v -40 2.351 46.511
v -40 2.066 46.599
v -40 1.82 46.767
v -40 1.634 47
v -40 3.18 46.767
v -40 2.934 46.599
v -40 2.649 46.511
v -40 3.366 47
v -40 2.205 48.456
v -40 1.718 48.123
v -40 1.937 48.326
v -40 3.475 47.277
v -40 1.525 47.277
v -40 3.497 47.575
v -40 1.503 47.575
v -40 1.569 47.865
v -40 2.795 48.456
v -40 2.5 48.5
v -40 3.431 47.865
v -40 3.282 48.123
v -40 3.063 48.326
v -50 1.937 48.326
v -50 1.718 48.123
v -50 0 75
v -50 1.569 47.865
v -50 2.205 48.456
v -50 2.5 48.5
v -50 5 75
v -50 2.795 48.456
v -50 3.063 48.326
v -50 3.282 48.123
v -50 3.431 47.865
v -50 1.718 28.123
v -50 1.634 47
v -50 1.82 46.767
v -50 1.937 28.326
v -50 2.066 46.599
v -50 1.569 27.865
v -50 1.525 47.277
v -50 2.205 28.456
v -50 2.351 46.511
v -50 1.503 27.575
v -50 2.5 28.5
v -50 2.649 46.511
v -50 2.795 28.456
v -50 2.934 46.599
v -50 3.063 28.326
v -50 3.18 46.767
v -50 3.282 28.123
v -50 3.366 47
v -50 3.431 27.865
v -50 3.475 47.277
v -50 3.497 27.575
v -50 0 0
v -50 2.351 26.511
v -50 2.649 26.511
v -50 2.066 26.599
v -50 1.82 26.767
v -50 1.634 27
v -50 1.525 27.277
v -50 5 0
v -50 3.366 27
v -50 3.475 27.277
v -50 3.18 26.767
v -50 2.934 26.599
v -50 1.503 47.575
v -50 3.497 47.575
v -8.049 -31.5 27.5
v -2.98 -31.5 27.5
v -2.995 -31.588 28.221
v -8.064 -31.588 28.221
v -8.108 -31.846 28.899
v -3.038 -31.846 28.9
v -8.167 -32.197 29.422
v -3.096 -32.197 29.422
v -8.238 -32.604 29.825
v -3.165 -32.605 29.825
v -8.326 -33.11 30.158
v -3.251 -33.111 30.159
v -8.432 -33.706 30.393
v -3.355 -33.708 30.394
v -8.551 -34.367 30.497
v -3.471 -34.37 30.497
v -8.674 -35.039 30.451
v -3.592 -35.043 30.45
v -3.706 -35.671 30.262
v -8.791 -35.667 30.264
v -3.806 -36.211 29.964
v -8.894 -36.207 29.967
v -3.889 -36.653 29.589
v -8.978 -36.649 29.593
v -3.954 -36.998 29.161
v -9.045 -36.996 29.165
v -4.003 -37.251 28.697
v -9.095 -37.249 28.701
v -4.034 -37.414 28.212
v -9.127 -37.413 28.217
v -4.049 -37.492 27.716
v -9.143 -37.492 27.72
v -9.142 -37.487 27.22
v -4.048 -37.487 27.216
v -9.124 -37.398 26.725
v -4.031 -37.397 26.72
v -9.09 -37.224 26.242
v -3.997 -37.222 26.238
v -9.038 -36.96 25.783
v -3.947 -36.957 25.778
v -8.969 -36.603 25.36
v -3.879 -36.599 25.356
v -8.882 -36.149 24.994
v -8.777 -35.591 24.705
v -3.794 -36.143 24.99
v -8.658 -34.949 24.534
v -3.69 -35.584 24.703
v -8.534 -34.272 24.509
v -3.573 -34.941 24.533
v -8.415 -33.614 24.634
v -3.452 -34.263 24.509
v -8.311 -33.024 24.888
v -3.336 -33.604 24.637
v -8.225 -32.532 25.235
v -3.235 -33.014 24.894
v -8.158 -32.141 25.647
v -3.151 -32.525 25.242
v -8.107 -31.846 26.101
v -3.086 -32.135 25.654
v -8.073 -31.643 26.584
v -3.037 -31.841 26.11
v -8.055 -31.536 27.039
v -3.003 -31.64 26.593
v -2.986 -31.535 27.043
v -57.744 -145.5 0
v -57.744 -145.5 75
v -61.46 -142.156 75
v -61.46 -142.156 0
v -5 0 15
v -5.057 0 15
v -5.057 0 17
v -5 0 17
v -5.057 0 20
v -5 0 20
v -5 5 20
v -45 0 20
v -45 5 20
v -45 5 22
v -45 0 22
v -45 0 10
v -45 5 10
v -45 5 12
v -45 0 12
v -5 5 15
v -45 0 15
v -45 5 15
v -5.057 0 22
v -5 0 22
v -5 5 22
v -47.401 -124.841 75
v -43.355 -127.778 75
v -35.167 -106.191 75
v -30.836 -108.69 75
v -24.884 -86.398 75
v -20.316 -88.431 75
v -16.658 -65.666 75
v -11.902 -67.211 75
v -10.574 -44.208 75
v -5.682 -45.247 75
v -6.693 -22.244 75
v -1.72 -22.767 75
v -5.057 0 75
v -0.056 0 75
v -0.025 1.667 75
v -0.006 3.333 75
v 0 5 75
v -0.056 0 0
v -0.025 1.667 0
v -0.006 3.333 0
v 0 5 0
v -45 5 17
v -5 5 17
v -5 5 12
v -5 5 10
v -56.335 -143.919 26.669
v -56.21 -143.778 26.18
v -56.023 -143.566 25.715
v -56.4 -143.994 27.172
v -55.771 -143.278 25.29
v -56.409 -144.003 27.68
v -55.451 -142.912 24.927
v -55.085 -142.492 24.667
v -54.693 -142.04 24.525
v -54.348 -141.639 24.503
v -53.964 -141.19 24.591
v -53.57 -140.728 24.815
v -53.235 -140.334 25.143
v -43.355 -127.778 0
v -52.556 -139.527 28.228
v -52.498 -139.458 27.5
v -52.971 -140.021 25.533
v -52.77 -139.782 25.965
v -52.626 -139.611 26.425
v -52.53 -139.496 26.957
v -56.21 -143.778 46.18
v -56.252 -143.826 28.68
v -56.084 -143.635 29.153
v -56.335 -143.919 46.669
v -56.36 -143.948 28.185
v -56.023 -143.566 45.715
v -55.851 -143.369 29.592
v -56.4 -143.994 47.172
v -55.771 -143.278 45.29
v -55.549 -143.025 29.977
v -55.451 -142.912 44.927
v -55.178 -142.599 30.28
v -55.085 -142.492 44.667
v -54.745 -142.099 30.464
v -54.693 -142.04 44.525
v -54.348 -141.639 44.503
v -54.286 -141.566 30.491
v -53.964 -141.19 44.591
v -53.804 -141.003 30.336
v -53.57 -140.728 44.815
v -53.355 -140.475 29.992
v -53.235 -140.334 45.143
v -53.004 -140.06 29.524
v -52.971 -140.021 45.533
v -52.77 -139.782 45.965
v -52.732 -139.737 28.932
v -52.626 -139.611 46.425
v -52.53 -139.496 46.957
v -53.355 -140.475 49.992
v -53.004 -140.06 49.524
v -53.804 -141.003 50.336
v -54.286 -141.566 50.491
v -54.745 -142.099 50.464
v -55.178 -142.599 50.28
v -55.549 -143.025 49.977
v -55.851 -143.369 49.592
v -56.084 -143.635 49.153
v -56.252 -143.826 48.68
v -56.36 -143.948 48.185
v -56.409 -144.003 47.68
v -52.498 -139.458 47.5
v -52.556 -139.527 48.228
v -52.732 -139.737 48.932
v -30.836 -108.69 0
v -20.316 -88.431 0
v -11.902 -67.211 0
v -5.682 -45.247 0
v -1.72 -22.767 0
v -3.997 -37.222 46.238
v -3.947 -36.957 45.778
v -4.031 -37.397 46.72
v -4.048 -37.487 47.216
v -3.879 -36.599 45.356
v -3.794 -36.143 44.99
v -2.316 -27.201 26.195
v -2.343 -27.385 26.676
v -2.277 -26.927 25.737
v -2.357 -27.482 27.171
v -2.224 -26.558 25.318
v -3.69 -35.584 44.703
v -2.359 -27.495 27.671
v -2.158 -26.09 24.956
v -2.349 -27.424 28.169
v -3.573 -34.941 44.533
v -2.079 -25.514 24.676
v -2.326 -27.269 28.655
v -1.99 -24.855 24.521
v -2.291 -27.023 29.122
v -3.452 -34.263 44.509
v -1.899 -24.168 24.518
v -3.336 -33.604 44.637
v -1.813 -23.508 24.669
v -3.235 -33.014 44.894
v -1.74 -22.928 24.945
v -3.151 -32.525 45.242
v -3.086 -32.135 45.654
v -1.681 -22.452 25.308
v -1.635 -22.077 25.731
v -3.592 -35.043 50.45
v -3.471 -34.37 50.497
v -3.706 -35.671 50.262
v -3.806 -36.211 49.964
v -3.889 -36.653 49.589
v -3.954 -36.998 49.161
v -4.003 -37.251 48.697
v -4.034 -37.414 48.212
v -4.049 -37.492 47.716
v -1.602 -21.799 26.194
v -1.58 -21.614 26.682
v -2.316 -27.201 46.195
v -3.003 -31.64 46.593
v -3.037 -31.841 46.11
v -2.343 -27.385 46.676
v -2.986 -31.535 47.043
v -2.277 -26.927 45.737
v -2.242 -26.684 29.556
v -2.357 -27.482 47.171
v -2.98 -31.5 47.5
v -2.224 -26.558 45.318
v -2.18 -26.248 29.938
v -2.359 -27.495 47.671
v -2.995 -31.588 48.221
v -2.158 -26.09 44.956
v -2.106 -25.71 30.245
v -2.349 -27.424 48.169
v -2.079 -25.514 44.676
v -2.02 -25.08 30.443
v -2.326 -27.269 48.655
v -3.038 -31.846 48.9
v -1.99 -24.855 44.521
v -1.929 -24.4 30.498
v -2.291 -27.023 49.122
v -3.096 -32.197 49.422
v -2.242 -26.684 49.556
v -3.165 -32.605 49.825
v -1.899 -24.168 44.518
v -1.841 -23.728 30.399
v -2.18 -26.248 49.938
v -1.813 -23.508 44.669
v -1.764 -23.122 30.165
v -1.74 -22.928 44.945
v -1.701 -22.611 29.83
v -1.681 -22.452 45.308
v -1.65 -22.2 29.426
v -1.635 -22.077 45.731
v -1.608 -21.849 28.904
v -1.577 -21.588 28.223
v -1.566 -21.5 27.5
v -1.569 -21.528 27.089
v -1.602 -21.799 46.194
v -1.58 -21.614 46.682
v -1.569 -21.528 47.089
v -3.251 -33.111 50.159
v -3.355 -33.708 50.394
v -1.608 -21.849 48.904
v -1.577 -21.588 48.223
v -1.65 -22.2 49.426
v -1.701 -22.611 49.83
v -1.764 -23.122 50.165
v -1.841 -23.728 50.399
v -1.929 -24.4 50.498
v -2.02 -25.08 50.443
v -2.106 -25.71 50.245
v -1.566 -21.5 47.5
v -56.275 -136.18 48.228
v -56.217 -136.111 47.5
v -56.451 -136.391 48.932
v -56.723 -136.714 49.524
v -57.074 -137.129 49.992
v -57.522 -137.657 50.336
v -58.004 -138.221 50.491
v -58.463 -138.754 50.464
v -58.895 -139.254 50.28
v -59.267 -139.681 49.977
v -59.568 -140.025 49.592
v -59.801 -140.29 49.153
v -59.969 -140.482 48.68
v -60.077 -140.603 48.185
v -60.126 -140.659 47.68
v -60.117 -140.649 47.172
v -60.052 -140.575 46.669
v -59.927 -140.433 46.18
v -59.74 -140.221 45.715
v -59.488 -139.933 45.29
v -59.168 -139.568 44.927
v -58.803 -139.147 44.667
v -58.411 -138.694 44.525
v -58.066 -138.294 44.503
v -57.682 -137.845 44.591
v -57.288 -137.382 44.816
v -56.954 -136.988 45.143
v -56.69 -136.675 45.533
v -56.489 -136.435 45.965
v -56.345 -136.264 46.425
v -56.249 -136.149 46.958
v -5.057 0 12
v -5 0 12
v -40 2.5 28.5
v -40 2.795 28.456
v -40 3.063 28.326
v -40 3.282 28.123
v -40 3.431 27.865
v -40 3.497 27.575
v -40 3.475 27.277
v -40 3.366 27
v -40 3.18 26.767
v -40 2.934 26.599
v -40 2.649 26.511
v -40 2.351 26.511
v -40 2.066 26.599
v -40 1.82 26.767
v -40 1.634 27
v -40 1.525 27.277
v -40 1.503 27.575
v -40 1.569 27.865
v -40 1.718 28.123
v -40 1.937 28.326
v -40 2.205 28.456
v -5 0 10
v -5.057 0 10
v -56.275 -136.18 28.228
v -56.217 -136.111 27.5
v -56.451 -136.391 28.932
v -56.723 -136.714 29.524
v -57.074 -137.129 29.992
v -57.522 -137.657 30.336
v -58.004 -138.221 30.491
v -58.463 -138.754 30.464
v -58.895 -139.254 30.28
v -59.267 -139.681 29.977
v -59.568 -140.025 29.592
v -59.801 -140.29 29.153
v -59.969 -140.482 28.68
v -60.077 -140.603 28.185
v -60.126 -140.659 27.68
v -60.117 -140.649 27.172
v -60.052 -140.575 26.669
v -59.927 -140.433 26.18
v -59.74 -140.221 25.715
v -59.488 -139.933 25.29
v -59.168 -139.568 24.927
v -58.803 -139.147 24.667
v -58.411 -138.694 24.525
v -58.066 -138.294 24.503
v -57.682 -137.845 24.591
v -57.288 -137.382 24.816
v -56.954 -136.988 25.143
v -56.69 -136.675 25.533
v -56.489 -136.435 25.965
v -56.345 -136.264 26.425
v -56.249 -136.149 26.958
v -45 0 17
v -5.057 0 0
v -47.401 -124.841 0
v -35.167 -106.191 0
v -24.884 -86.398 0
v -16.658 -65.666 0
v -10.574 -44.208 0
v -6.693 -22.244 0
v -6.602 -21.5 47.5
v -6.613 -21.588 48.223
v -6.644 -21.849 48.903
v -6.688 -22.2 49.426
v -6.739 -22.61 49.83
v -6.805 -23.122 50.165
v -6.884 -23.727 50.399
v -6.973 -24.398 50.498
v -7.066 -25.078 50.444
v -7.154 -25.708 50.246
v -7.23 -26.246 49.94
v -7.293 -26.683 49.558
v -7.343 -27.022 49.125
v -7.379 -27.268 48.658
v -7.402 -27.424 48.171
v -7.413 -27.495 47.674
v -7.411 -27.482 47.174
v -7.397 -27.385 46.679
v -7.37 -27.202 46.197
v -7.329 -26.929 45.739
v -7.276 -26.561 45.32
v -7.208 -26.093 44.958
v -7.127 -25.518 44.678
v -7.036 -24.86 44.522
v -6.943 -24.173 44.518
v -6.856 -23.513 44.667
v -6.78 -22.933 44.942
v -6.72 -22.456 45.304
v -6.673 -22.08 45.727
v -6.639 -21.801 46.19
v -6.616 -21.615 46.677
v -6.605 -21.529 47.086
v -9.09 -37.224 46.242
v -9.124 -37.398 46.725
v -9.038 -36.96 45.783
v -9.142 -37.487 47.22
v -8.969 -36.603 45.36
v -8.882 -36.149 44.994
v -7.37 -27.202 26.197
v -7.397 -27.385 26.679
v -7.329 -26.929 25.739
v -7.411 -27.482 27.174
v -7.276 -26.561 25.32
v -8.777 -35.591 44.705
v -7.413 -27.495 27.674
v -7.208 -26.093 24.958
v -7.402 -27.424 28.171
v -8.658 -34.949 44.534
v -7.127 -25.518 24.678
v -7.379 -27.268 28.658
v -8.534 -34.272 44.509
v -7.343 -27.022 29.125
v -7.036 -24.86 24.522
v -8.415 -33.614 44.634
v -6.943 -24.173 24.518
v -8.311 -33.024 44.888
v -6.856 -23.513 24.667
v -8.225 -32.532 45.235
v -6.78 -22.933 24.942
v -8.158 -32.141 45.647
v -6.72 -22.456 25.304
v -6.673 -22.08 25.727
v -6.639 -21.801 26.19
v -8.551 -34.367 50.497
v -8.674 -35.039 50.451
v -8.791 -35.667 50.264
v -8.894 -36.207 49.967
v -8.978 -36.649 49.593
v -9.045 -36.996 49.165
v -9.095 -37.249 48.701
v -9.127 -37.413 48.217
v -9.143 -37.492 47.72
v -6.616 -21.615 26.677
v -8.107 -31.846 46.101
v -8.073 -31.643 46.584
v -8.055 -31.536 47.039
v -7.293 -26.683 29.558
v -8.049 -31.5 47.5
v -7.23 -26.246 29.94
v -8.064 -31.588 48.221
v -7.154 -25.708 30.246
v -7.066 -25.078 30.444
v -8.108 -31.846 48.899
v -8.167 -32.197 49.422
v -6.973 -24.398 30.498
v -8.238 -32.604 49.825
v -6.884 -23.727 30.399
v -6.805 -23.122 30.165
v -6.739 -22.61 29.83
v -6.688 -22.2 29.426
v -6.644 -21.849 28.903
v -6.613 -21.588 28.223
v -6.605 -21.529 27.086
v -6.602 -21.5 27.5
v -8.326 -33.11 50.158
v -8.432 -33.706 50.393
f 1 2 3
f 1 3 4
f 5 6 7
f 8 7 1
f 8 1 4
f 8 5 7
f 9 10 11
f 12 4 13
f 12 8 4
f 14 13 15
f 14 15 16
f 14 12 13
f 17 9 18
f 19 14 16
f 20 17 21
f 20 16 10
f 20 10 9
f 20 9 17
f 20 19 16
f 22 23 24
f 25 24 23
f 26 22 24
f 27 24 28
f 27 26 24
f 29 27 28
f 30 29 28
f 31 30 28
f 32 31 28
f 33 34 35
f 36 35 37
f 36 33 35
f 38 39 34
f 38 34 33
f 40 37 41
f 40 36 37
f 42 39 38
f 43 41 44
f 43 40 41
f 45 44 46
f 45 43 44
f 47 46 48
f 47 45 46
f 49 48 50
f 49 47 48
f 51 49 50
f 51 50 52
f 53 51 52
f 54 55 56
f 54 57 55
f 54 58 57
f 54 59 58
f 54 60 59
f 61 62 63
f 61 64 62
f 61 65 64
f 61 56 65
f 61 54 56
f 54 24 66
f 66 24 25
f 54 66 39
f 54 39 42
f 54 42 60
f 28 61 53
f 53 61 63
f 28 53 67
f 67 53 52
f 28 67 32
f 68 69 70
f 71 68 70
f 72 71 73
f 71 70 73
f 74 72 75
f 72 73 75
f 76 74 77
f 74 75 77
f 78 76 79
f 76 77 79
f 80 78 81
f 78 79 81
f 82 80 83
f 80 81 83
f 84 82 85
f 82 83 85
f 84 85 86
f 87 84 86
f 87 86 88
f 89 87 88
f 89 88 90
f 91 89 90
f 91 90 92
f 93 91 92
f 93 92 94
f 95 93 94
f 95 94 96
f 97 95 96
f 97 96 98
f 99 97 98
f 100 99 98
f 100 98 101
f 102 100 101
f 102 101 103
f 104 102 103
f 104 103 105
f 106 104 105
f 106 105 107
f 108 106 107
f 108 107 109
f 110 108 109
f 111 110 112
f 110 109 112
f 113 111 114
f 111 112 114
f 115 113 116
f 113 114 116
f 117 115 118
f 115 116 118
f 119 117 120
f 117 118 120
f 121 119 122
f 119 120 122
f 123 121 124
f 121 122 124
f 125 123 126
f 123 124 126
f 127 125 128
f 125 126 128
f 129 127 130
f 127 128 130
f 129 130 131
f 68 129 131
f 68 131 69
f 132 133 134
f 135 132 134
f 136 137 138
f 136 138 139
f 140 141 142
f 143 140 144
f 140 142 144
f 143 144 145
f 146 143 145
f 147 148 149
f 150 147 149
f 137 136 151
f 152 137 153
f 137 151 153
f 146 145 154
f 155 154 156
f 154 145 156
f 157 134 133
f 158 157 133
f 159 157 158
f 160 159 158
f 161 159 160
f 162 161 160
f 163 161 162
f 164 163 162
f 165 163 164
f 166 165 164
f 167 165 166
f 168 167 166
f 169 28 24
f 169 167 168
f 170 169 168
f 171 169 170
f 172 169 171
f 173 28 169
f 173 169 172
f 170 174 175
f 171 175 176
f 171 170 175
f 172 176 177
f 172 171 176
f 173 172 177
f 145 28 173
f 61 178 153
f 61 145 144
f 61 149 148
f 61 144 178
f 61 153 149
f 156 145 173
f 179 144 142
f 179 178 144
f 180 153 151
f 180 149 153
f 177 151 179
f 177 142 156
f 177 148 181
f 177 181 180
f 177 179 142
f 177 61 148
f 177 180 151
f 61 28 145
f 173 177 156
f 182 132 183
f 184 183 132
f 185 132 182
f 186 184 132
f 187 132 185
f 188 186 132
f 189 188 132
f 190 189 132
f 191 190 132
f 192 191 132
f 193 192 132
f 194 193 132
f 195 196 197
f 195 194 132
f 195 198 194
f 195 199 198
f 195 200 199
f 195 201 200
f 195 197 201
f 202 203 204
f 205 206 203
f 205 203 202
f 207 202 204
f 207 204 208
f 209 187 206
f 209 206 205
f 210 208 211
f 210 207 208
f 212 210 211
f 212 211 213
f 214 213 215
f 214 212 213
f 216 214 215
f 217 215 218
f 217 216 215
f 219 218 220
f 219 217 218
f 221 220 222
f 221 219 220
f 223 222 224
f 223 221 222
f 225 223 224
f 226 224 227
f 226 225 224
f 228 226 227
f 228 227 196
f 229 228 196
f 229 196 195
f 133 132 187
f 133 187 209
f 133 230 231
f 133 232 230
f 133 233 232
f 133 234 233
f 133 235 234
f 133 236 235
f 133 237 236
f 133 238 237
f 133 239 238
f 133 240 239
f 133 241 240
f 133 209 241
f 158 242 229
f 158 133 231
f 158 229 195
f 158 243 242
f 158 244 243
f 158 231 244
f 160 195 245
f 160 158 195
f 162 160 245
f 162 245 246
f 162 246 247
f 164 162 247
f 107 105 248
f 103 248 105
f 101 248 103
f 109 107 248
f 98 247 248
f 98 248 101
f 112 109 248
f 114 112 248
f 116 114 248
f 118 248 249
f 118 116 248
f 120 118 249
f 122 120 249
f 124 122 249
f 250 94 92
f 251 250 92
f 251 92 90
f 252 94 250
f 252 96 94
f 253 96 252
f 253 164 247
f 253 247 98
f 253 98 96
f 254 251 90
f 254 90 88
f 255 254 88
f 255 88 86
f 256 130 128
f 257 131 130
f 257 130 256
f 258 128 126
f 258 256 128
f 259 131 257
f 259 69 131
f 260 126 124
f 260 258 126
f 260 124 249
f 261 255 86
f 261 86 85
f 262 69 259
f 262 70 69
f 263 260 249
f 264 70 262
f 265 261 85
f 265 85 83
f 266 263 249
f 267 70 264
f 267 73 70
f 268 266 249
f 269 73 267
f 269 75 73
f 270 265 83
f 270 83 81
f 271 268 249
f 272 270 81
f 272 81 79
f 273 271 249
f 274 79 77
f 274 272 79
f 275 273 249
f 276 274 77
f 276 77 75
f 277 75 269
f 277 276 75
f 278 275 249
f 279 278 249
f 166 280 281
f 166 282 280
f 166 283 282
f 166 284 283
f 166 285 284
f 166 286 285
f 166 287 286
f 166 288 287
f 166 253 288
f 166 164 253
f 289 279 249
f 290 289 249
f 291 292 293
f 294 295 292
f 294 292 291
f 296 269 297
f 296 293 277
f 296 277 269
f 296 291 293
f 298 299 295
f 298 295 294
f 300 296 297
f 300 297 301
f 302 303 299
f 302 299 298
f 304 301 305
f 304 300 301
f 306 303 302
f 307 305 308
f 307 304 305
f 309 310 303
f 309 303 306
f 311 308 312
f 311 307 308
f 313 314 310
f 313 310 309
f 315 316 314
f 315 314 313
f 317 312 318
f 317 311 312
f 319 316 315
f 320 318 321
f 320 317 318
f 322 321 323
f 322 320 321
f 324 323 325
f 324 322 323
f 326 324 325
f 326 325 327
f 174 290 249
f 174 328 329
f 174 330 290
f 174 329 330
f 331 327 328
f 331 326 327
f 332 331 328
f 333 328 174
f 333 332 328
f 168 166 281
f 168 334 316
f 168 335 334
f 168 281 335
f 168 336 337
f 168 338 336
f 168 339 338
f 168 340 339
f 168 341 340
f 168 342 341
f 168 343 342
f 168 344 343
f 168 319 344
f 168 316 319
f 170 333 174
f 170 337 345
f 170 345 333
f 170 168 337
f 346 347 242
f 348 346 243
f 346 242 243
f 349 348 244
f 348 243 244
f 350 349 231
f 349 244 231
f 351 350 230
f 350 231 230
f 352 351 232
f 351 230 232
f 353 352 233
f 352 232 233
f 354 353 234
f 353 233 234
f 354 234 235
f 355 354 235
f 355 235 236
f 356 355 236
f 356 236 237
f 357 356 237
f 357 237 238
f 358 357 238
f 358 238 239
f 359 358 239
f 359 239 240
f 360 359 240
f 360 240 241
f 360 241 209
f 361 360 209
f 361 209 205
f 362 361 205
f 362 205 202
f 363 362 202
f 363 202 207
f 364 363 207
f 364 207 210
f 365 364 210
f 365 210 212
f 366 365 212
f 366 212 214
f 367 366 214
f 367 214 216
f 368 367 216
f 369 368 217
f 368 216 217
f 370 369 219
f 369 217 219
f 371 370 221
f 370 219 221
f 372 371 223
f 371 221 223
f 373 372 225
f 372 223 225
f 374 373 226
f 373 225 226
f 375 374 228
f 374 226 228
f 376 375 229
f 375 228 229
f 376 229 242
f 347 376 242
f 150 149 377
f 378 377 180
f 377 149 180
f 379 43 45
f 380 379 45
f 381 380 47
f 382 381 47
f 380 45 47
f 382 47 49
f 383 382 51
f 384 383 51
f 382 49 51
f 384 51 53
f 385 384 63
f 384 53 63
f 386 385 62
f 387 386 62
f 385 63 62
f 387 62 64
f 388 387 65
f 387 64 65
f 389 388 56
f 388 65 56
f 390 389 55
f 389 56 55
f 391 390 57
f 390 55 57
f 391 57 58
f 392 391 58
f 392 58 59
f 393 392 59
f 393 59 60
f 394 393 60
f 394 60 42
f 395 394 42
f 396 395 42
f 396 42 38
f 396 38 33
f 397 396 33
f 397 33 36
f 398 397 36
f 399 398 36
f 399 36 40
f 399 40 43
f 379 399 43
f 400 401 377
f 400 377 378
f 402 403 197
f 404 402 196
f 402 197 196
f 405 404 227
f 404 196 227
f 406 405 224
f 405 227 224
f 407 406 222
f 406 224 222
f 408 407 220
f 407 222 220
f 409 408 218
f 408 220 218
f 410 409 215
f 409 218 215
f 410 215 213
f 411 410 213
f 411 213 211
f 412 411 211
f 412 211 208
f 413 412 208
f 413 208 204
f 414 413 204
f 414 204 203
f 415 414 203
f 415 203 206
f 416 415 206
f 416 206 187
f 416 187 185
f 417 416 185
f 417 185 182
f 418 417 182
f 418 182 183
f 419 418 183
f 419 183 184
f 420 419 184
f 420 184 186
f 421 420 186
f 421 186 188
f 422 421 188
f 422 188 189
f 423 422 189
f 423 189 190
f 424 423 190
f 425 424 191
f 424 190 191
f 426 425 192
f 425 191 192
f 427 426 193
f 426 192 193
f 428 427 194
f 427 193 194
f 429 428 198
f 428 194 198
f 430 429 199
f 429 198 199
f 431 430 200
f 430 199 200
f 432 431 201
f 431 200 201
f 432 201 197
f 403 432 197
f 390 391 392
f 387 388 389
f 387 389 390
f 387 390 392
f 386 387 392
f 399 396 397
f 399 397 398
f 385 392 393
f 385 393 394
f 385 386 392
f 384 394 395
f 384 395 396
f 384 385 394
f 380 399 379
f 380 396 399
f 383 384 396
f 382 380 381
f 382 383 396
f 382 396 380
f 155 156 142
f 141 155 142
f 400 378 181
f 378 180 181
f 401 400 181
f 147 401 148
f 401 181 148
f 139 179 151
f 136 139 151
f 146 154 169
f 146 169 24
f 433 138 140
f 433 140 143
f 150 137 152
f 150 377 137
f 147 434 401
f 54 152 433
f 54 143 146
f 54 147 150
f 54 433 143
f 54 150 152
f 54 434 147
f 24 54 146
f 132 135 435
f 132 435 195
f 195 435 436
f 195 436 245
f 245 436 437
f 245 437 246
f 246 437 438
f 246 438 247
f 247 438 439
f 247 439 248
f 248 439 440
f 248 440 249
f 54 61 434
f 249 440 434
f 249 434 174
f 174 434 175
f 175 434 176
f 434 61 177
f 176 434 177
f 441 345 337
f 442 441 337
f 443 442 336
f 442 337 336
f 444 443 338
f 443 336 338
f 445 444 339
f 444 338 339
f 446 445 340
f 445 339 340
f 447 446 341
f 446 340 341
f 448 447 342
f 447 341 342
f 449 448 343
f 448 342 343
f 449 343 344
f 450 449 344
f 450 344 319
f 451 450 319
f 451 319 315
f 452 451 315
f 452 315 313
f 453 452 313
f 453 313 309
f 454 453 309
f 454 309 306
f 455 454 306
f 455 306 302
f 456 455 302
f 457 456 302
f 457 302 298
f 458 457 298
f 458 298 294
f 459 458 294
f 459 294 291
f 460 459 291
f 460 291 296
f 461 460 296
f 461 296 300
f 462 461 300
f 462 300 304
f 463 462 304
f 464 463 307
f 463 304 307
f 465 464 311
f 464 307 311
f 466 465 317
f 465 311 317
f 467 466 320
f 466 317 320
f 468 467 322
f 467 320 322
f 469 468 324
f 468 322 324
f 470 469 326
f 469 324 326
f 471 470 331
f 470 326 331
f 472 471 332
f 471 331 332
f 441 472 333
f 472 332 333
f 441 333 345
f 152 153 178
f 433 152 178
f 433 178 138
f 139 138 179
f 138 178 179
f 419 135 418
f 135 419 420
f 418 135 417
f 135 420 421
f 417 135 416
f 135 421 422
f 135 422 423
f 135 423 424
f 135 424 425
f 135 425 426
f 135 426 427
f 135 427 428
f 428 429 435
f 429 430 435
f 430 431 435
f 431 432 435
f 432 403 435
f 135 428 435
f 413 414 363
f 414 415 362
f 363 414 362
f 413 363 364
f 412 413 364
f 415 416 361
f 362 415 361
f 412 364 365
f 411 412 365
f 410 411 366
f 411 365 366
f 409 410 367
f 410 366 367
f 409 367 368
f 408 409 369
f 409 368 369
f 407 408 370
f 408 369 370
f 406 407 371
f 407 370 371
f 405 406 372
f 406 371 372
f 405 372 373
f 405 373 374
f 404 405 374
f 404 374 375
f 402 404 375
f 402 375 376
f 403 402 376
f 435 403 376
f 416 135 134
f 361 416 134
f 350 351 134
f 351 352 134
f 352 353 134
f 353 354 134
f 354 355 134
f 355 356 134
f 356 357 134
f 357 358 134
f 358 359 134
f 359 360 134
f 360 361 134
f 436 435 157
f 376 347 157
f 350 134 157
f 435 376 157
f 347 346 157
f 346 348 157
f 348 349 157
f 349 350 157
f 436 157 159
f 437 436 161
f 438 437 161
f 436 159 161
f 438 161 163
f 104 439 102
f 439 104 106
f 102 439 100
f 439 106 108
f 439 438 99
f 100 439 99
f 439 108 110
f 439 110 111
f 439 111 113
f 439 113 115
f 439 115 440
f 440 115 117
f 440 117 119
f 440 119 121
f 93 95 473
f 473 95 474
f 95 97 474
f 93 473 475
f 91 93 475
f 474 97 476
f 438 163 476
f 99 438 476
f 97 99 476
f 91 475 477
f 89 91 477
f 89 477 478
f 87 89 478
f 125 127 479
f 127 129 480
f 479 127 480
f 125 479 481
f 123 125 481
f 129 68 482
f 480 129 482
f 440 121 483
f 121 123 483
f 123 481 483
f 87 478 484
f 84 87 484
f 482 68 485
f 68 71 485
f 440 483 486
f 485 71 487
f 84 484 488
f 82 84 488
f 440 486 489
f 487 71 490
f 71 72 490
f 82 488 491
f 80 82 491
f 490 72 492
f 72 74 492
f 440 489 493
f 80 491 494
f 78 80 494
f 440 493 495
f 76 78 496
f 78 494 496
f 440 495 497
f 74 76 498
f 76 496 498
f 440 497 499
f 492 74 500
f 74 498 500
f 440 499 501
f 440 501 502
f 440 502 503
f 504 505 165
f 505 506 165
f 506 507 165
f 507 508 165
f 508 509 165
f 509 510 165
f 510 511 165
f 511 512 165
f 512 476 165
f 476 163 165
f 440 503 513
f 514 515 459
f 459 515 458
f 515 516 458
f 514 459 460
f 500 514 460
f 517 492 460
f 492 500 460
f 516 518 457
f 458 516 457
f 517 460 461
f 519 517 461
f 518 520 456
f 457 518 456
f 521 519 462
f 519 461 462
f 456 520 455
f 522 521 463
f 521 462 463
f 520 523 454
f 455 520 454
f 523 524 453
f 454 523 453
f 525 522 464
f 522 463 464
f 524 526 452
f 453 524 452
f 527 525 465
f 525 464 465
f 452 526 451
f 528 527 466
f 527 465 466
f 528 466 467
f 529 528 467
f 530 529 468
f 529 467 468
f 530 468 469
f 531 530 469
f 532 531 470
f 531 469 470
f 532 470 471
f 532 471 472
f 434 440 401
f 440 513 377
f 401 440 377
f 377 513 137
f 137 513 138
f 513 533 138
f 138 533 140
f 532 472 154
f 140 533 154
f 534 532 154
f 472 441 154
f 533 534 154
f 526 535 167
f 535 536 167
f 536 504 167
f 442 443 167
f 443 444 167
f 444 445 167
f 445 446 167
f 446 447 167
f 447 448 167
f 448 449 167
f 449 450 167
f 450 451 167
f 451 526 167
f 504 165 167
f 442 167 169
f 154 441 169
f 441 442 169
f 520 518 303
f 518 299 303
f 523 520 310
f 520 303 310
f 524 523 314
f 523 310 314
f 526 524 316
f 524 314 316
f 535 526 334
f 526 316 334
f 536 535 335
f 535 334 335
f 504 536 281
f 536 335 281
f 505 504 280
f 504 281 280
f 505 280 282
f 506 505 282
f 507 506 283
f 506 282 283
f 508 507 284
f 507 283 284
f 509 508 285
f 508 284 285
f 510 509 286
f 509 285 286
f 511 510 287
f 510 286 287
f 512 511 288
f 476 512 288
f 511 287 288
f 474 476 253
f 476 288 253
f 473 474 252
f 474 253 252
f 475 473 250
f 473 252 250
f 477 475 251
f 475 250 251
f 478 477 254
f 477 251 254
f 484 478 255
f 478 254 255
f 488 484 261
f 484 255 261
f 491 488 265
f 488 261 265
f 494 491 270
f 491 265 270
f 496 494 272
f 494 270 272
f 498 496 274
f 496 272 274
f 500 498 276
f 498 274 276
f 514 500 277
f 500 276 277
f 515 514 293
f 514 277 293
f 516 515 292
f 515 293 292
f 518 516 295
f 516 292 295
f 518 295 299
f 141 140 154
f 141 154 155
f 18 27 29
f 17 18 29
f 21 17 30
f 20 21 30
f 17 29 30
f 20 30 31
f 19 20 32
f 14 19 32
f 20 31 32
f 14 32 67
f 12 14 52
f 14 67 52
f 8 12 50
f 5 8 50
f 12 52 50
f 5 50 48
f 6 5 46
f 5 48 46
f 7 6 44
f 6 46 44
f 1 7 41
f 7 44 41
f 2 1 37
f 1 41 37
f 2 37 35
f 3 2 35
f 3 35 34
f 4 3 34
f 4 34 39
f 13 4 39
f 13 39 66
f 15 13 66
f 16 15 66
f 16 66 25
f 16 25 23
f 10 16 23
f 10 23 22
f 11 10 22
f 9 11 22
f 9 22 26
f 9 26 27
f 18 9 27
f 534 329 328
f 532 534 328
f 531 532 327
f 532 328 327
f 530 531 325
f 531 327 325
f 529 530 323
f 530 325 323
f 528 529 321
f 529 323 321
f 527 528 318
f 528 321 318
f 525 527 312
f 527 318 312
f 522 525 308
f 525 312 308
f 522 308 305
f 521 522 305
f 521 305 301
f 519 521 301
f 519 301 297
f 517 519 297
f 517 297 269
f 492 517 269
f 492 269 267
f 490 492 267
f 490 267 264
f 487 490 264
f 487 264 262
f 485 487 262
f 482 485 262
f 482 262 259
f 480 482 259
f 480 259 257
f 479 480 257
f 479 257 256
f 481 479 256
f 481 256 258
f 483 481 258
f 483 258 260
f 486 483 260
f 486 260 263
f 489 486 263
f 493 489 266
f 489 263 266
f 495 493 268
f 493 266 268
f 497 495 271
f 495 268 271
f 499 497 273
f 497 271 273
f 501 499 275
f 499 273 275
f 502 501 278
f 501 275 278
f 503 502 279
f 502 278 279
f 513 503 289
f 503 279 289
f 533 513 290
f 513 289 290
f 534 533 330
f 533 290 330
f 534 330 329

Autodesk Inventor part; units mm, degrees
ref_plane "YZ Plane" through (0, 0, 0) normal (1, 0, 0) x (0, 1, 0)
sketch "Sketch1" plane through (0, 0, 0) normal (0, 0, 1) x (1, 0, 0)
  line L0 (0, 0) -> (-50, 0)
  line L1 (-50, 0) -> (-50, 5)
  line L2 (-50, 5) -> (0, 5)
  line L3 (0, 5) -> (0, 0)
  dimension "d0" = 50
  dimension "d1" = 5
extrude "Extrusion1" add sketch "Sketch1" along normal blind 75
sketch "Sketch2" plane through (0, 0, 75) normal (0, 0, 1) x (1, 0, 0)
  circle A0 centre (-225, 5) radius 225 construction
  circle A1 centre (-225, 5) radius 220 construction
  line L0 (0, 0) -> (0, 5) projected
  line L1 (0, 5) -> (-5, 5)
  arc A2 (-57.7435, -145.5) -> (0, 5) centre (-225, 5) ccw
  line L2 (-57.7435, -145.5) -> (-61.4603, -142.1556)
  arc A3 (-61.4603, -142.1556) -> (-5, 5) centre (-225, 5) ccw
  dimension "d4" = 450
  dimension "d5" = 5
  dimension "d6" = 5
  dimension "d7" = 150.5
extrude "Extrusion2" add sketch "Sketch2" against normal blind 75
sketch "Sketch3" plane through (-50, 5, 0) normal (0, 1, 0) x (1, 0, 0)
  line L0 (45, -10) -> (5, -10)
  line L1 (5, -10) -> (5, -12)
  line L2 (5, -12) -> (45, -12)
  line L3 (45, -12) -> (45, -10)
  line L4 (0, 0) -> (0, -75) projected
  line L5 (0, 0) -> (50, 0) projected
  line L6 (5, -17) -> (45, -17)
  line L7 (45, -17) -> (45, -15)
  line L8 (45, -15) -> (5, -15)
  line L9 (5, -15) -> (5, -17)
  line L10 (5, -22) -> (45, -22)
  line L11 (45, -22) -> (45, -20)
  line L12 (45, -20) -> (5, -20)
  line L13 (5, -20) -> (5, -22)
  dimension "d10" = 40
  dimension "d11" = 2
  dimension "d12" = 5
  dimension "d13" = 10
  dimension "d16" = 5
extrude "Extrusion3" cut sketch "Sketch3" against normal blind 5
ref_plane "Work Plane1" through (0, 5, 0) normal (1, 0, 0) x (0, 1, 0)
sketch "Sketch4" plane through (0, 5, 0) normal (1, 0, 0) x (0, 1, 0)
  circle A0 centre (-29.5, 47.5) radius 3
  circle A1 centre (-29.5, 27.5) radius 3
  line L0 (-5, 0) -> (-5, 75) projected
  line L1 (-150.5, 0) -> (-5, 0) projected
  circle A2 centre (-39.5, 47.5) radius 3
  circle A3 centre (-39.5, 27.5) radius 3
  line L2 (0, 0) -> (0, 75) projected
  dimension "d23" = 6
  dimension "d24" = 6
  dimension "d26" = 27.5
  dimension "d27" = 20
  dimension "d30" = 6
  dimension "d31" = 6
  dimension "d32" = 10
  dimension "d33" = 29.5
extrude "Extrusion4" cut sketch "Sketch4" along normal through all both and the other way through all
ref_plane "Work Plane2" through (-57.7435, -145.5, 75) normal (0.7434, -0.6689, 0) x (0.6689, 0.7434, 0)
sketch "Sketch5" plane through (-57.7435, -145.5, 75) normal (0.7434, -0.6689, 0) x (0.6689, 0.7434, 0)
  circle A0 centre (5, -27.5) radius 3
  circle A1 centre (5, -47.5) radius 3
  line L0 (0, 0) -> (0, -75) projected
  line L1 (0, -75) -> (146.746, -75) projected
  point P0 (146.7832, -75)
  dimension "d34" = 6
  dimension "d35" = 6
  dimension "d36" = 5
  dimension "d37" = 27.5
  dimension "d38" = 20
extrude "Extrusion5" cut sketch "Sketch5" along normal through all both and the other way through all
sketch "Sketch6" plane through (-50, 0, 0) normal (-1, 0, 0) x (0, 0, 1)
  circle A0 centre (47.5, 2.5) radius 1
  circle A1 centre (27.5, 2.5) radius 1
  line L0 (0, 0) -> (0, 5) projected
  line L1 (0, 5) -> (75, 5) projected
  dimension "d41" = 2
  dimension "d42" = 2
  dimension "d43" = 27.5
  dimension "d44" = 20
  dimension "d45" = 2.5
extrude "Extrusion6" cut sketch "Sketch6" against normal blind 10
thread "Thread1" size "M2x0.4" class "6H" standard "ANSI Metric M Profile" full length
thread "Thread2" size "M2x0.4" class "6H" standard "ANSI Metric M Profile" full length
sketch "Sketch7" plane through (0, 0, 75) normal (0, 0, 1) x (1, 0, 0)
  circle A0 centre (-225, 5) radius 225
  circle A1 centre (-225, 5) radius 230
  point P0 (0, 0)
  point P1 (0, 5)
  dimension "d52" = 450
  dimension "d53" = 5
extrude "Extrusion7" cut sketch "Sketch7" against normal through all
properties part number "CW005" material "ABS Plastic"
